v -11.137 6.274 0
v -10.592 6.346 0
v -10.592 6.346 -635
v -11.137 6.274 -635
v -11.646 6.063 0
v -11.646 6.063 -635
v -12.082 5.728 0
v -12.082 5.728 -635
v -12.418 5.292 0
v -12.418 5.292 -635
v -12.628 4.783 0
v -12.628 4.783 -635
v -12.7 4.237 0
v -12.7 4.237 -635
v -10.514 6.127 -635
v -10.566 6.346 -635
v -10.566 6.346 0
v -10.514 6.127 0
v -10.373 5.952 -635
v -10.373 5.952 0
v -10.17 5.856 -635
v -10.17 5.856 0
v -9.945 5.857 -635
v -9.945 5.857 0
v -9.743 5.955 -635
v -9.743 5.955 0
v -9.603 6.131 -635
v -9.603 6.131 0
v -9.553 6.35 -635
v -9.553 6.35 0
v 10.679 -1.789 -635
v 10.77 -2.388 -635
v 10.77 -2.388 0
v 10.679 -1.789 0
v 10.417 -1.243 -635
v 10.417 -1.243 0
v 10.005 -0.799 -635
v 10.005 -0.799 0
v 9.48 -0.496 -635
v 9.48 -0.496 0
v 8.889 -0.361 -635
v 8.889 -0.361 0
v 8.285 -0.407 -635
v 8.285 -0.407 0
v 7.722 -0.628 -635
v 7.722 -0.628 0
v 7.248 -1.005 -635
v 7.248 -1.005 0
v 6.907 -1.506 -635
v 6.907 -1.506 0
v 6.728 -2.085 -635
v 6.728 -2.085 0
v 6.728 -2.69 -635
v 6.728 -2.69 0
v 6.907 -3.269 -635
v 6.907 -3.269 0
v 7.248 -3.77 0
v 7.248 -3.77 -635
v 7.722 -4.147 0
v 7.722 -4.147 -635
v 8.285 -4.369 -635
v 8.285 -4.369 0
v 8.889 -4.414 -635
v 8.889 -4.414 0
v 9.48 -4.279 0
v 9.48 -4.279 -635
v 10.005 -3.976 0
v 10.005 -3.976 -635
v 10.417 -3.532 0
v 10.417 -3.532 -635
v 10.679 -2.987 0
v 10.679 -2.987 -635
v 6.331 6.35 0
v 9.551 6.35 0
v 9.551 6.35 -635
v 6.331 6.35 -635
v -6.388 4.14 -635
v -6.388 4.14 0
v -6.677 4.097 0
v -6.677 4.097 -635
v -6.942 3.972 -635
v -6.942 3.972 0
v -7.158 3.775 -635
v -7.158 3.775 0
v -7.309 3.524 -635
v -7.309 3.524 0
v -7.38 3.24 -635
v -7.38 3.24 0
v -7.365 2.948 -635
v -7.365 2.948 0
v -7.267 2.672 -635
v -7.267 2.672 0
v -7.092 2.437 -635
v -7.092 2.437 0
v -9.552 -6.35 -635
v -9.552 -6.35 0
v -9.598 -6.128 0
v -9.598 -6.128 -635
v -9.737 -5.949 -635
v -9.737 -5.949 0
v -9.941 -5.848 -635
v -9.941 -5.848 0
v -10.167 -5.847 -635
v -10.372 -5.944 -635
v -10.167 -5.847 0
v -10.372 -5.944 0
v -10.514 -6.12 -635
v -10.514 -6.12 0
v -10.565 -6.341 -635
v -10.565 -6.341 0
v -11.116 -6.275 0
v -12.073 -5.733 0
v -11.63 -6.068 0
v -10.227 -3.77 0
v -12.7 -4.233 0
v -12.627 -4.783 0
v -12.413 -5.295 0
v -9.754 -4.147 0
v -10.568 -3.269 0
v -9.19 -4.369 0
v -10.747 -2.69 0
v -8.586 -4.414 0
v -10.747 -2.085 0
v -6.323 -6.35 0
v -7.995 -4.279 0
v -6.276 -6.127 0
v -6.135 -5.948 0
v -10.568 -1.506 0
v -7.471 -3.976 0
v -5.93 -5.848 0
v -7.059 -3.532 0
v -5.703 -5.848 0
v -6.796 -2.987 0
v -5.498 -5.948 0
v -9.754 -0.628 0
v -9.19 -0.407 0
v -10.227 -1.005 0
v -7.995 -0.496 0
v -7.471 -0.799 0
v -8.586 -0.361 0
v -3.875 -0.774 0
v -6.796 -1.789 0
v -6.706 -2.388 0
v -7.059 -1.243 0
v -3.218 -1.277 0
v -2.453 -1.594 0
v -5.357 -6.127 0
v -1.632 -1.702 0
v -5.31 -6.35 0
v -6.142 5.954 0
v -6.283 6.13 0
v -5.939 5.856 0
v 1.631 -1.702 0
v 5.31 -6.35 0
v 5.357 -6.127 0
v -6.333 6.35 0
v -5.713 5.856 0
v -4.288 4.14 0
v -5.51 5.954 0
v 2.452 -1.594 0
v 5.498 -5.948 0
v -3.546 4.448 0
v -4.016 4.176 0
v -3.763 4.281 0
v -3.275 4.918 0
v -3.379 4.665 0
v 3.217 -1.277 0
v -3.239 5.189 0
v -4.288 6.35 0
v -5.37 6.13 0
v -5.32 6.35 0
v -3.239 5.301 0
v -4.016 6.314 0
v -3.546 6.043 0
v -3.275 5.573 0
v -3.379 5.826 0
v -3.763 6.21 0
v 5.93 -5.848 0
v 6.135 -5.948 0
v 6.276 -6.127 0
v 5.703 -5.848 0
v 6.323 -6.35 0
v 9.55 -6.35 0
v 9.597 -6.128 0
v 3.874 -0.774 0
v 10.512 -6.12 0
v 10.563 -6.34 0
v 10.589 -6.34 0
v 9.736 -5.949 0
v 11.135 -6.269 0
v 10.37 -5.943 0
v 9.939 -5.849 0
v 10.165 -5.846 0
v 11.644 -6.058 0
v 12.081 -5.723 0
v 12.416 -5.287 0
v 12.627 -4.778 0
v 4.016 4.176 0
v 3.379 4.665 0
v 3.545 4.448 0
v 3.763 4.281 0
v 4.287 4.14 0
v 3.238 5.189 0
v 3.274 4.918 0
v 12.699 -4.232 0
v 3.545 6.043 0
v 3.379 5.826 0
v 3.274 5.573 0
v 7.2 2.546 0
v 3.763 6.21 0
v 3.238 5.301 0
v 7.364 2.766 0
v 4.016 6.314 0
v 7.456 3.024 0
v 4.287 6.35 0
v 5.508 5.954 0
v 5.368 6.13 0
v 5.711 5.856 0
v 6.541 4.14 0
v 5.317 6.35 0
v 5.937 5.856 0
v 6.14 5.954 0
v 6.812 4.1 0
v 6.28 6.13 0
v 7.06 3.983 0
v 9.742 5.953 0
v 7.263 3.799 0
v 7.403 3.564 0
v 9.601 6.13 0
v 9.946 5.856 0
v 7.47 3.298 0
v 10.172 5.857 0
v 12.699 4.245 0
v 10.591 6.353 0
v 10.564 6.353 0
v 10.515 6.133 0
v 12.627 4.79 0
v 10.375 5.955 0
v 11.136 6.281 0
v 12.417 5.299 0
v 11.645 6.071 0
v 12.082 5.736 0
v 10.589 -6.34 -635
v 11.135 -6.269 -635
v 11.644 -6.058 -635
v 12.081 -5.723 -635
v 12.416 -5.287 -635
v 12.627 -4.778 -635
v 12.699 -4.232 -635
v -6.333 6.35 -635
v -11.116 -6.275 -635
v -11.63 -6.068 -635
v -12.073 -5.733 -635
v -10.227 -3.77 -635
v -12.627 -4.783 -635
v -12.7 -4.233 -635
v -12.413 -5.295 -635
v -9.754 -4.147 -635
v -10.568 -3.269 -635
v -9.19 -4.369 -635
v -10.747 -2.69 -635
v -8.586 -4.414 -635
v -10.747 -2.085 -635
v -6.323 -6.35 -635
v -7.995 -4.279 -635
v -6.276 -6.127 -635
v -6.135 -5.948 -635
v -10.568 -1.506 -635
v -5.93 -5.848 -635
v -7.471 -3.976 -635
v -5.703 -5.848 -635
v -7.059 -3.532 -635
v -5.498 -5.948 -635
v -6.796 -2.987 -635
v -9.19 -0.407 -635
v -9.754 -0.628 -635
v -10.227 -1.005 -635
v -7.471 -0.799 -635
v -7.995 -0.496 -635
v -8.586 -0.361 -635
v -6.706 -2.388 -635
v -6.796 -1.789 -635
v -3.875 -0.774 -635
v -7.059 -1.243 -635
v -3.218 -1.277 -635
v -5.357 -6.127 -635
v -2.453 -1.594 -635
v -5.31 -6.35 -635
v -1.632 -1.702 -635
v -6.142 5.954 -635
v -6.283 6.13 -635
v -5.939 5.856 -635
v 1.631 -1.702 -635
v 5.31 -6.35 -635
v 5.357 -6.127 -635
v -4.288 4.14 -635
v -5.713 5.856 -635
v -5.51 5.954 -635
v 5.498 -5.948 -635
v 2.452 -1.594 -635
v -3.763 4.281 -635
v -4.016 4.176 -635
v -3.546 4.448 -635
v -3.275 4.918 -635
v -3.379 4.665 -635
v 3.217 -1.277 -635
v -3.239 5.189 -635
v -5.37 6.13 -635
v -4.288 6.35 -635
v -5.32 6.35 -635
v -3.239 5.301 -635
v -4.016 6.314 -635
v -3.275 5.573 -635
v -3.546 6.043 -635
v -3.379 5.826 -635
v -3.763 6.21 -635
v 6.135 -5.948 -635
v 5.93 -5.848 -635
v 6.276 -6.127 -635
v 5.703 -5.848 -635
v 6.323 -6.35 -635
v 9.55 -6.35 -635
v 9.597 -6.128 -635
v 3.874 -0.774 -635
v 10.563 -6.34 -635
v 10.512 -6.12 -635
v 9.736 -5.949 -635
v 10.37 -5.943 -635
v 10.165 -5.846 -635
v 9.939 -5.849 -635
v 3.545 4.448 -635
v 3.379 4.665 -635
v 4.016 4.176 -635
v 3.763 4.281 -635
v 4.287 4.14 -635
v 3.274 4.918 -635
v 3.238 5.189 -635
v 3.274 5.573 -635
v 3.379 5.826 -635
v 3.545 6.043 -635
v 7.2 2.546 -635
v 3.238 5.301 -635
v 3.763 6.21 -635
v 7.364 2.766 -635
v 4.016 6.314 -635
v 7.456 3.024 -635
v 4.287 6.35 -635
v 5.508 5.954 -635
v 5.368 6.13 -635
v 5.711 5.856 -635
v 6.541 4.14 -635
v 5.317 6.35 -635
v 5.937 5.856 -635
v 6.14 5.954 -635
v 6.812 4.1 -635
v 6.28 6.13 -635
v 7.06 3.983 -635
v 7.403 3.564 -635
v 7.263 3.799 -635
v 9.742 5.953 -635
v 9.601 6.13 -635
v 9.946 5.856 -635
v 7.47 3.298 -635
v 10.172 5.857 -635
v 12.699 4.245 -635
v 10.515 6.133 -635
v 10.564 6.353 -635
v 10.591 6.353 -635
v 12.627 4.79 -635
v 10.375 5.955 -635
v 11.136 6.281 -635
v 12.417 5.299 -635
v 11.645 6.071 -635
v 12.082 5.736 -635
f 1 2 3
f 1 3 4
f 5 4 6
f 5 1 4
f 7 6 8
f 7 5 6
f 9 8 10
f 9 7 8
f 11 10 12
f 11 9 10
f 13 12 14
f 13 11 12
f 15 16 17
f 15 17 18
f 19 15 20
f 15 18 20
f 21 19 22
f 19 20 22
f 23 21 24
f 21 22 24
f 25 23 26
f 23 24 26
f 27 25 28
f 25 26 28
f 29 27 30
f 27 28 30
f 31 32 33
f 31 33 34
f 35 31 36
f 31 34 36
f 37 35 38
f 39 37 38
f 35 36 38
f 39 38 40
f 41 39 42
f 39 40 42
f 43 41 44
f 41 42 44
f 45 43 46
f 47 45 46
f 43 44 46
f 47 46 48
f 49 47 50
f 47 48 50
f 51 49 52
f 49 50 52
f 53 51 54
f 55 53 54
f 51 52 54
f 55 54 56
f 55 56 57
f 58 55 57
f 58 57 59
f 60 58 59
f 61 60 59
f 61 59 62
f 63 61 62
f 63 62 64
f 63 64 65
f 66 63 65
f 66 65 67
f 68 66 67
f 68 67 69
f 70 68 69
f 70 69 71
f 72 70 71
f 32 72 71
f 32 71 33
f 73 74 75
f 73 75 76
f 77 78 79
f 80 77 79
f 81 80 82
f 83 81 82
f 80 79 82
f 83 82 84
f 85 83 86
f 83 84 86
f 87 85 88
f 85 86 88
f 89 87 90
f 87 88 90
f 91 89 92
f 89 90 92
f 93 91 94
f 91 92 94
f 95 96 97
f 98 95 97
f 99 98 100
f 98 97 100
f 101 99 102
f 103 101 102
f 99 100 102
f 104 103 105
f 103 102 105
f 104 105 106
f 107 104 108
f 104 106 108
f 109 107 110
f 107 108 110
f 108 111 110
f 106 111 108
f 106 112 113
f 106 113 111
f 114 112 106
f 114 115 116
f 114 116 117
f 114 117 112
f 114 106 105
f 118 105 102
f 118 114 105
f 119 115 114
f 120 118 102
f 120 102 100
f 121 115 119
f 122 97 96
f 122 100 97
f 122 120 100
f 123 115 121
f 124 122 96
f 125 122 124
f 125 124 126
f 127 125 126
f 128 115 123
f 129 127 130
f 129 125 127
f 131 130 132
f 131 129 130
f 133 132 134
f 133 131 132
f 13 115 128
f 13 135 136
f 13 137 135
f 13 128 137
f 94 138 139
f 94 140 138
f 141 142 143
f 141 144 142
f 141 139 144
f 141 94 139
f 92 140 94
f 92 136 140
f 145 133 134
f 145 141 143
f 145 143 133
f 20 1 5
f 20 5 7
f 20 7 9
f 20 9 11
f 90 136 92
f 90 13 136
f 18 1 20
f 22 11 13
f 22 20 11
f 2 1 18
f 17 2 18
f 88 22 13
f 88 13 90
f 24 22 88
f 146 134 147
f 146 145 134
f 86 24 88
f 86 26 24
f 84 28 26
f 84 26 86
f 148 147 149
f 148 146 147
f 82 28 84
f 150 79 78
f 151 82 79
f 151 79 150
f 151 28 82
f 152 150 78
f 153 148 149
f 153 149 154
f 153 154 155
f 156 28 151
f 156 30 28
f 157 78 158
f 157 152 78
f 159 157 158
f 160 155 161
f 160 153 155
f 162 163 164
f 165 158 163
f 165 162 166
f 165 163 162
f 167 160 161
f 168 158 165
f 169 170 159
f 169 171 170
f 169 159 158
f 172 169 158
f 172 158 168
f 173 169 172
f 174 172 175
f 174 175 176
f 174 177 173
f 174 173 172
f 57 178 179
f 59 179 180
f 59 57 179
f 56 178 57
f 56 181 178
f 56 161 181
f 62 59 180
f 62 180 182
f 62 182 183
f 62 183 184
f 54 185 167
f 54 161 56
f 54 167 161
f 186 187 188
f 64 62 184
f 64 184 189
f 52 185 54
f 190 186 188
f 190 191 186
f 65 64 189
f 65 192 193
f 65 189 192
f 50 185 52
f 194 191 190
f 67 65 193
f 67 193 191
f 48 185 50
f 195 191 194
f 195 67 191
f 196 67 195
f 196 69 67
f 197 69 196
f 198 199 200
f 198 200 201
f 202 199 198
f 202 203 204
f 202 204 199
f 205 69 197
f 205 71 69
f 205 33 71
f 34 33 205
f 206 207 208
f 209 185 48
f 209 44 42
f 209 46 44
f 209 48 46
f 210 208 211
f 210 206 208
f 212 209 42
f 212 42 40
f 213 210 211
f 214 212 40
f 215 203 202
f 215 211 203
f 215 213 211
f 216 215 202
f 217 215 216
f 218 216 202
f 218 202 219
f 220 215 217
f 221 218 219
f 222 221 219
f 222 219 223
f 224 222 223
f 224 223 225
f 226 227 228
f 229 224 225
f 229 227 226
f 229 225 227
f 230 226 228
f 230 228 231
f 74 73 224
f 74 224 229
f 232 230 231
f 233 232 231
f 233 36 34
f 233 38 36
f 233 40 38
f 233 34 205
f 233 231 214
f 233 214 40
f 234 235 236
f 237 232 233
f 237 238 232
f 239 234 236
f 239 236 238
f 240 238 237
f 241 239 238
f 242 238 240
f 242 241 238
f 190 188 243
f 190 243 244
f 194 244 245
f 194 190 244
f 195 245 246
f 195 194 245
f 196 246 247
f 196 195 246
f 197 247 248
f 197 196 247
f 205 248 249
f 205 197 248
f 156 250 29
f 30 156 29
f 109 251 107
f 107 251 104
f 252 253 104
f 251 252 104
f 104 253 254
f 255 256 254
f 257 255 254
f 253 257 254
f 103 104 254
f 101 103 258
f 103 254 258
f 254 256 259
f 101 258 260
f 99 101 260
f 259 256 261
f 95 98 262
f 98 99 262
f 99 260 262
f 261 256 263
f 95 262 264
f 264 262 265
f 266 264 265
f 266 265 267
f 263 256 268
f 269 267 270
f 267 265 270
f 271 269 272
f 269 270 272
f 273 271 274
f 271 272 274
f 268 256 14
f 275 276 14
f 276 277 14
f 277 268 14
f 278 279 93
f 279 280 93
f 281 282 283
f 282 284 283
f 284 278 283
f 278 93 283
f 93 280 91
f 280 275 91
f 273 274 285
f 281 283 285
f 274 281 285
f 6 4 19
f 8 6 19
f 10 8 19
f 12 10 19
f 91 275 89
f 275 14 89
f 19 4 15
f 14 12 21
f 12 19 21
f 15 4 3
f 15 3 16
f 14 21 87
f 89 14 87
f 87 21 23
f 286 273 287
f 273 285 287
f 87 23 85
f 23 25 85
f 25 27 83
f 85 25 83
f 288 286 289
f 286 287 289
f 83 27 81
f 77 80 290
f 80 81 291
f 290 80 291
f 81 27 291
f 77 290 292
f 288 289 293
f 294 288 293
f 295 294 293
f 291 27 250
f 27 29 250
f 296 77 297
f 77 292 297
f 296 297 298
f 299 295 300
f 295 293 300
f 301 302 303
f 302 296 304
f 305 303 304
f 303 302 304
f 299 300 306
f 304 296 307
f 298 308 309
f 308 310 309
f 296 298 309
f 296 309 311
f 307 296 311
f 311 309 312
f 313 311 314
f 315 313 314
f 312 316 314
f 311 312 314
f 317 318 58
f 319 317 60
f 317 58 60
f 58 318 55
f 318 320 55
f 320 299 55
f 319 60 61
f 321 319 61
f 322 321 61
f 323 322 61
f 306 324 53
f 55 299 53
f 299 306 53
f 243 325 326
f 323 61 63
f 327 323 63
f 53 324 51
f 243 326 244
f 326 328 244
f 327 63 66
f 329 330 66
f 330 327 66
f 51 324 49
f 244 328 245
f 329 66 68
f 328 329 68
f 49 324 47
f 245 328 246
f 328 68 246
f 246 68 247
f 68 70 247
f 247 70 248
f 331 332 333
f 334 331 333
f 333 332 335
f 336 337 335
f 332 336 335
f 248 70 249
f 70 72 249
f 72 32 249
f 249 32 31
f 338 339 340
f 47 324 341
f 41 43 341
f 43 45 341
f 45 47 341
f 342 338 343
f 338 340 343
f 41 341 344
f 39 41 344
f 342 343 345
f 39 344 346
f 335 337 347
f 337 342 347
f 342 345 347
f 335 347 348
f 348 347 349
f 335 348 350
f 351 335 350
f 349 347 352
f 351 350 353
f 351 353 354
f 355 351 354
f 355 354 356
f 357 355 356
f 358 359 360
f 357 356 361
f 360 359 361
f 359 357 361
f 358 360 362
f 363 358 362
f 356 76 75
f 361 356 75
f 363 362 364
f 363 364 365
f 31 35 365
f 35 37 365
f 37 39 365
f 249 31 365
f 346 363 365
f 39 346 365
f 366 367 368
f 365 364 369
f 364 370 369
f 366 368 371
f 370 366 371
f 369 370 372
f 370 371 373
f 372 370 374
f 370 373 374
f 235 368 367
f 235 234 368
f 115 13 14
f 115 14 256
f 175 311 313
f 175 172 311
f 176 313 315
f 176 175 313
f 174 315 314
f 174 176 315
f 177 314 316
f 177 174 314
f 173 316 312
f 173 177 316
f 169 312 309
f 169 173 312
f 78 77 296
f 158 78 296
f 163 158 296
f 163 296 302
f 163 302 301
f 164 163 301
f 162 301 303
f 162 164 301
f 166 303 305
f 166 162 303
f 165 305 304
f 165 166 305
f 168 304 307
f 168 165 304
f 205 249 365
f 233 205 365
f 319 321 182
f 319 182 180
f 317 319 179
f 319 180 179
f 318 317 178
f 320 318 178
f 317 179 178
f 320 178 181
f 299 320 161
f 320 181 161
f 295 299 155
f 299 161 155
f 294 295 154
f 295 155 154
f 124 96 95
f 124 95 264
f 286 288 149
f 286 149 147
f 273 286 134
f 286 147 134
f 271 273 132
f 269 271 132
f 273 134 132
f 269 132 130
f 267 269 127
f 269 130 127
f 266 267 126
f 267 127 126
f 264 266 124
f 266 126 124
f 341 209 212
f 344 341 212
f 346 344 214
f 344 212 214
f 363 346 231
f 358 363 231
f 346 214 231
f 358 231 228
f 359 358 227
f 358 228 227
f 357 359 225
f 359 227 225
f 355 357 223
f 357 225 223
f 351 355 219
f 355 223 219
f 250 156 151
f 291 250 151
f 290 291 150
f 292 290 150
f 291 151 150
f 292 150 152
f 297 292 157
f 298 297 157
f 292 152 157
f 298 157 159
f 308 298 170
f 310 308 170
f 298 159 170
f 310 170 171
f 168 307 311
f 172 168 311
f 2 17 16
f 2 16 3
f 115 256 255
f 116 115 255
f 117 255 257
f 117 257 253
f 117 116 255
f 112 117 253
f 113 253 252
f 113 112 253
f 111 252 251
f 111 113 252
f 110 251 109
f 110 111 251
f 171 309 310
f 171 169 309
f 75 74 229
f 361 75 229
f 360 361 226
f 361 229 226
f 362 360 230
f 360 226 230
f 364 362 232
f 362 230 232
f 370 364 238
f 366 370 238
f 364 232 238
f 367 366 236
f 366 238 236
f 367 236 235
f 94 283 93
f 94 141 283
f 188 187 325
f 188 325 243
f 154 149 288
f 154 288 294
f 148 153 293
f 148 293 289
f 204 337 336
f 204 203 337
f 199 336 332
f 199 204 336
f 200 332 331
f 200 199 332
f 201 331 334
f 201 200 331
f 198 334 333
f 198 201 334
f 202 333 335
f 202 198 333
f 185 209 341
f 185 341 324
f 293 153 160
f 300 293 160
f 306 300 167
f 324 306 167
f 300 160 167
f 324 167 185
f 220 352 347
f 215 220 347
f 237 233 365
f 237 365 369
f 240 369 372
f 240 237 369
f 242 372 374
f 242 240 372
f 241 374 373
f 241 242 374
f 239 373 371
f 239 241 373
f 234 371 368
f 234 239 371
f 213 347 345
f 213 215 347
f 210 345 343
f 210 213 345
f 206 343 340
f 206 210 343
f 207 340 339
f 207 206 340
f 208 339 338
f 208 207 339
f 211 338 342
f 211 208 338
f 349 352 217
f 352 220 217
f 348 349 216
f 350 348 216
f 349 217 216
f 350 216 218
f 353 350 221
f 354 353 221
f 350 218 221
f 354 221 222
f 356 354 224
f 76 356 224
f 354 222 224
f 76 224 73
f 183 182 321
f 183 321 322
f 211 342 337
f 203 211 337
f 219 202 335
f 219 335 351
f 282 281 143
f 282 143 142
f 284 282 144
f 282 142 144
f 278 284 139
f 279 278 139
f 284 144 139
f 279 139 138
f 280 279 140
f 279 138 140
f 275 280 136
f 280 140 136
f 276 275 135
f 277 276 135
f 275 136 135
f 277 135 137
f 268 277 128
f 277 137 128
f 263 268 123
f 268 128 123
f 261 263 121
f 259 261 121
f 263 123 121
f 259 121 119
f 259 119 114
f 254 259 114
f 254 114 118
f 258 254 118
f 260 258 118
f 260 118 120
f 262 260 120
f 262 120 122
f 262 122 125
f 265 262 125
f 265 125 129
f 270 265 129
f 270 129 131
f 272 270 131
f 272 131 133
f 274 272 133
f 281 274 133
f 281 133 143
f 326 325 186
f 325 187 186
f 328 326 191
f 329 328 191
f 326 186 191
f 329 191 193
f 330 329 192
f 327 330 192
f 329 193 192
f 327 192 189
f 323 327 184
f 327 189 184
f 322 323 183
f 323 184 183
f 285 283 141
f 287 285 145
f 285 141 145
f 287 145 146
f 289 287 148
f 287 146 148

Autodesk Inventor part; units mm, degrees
ref_plane "YZ Plane" through (0, 0, 0) normal (1, 0, 0) x (0, 1, 0)
ref_plane "XZ Plane" through (0, 0, 0) normal (0, 1, 0) x (-1, 0, 0)
ref_plane "XY Plane" through (0, 0, 0) normal (0, 0, 1) x (1, 0, 0)
sketch "Sketch1" plane through (0, 0, 0) normal (0, 0, 1) x (1, 0, 0)
  circle A0 centre (8.7376, -2.3876) radius 2.032
  circle A1 centre (-8.7376, -2.3876) radius 2.032
  arc A2 (9.5508, 6.3501) -> (10.564, 6.3532) centre (10.0574, 6.3501) ccw
  line L0 (9.5508, 6.3501) -> (6.3306, 6.3501)
  arc A3 (5.3174, 6.3501) -> (6.3306, 6.3501) centre (5.824, 6.3501) ccw
  line L1 (5.3174, 6.3501) -> (4.2872, 6.3501)
  arc A4 (4.2872, 6.3501) -> (3.2382, 5.3011) centre (4.2872, 5.3011) ccw
  line L2 (3.2382, 5.3011) -> (3.2382, 5.1893)
  arc A5 (3.2382, 5.1893) -> (4.2872, 4.1403) centre (4.2872, 5.1893) ccw
  line L3 (4.2872, 4.1403) -> (6.5409, 4.1403)
  arc A6 (7.2003, 2.5463) -> (6.5409, 4.1403) centre (6.5409, 3.2069) ccw
  line L4 (7.2003, 2.5463) -> (3.8742, -0.7738)
  arc A7 (1.6311, -1.7017) -> (3.8742, -0.7738) centre (1.6311, 1.4733) ccw
  line L5 (1.6311, -1.7017) -> (-1.6318, -1.7017)
  arc A8 (-3.8748, -0.7738) -> (-1.6318, -1.7017) centre (-1.6318, 1.4733) ccw
  line L6 (-3.8748, -0.7738) -> (-7.092, 2.4374)
  arc A9 (-6.3875, 4.1403) -> (-7.092, 2.4374) centre (-6.3875, 3.1432) ccw
  line L7 (-6.3875, 4.1403) -> (-4.2879, 4.1403)
  arc A10 (-4.2879, 4.1403) -> (-3.2388, 5.1893) centre (-4.2879, 5.1893) ccw
  line L8 (-3.2388, 5.1893) -> (-3.2388, 5.3011)
  arc A11 (-3.2388, 5.3011) -> (-4.2879, 6.3501) centre (-4.2879, 5.3011) ccw
  line L9 (-4.2879, 6.3501) -> (-5.3196, 6.3501)
  arc A12 (-6.3328, 6.3501) -> (-5.3196, 6.3501) centre (-5.8262, 6.3501) ccw
  line L10 (-6.3328, 6.3501) -> (-9.5528, 6.3501)
  arc A13 (-10.566, 6.3457) -> (-9.5528, 6.3501) centre (-10.0594, 6.3501) ccw
  line L11 (-10.566, 6.3457) -> (-10.5916, 6.3457)
  arc A14 (-10.5916, 6.3457) -> (-12.7, 4.2373) centre (-10.5916, 4.2373) ccw
  line L12 (-12.7, 4.2373) -> (-12.7, -4.2331)
  arc A15 (-12.7, -4.2331) -> (-10.5647, -6.3413) centre (-10.5916, -4.2331) ccw
  arc A16 (-9.5516, -6.35) -> (-10.5647, -6.3413) centre (-10.0581, -6.3412) ccw
  line L13 (-9.5516, -6.35) -> (-6.323, -6.35)
  arc A17 (-5.31, -6.35) -> (-6.323, -6.35) centre (-5.8165, -6.3412) ccw
  line L14 (-5.31, -6.35) -> (5.31, -6.35)
  arc A18 (6.323, -6.35) -> (5.31, -6.35) centre (5.8165, -6.3412) ccw
  line L15 (6.323, -6.35) -> (9.5502, -6.35)
  arc A19 (10.5633, -6.3403) -> (9.5502, -6.35) centre (10.0567, -6.3412) ccw
  line L16 (10.5633, -6.3403) -> (10.589, -6.3404)
  arc A20 (10.589, -6.3404) -> (12.6991, -4.2321) centre (10.5907, -4.2321) ccw
  line L17 (12.6991, -4.2321) -> (12.6991, 4.2448)
  arc A21 (12.6991, 4.2448) -> (10.5907, 6.3532) centre (10.5907, 4.2448) ccw
  line L18 (10.5907, 6.3532) -> (10.564, 6.3532)
  point P0 (0, 0)
extrude "Extrusion1" add sketch "Sketch1" against normal blind 635
properties part number "25in_1050"
